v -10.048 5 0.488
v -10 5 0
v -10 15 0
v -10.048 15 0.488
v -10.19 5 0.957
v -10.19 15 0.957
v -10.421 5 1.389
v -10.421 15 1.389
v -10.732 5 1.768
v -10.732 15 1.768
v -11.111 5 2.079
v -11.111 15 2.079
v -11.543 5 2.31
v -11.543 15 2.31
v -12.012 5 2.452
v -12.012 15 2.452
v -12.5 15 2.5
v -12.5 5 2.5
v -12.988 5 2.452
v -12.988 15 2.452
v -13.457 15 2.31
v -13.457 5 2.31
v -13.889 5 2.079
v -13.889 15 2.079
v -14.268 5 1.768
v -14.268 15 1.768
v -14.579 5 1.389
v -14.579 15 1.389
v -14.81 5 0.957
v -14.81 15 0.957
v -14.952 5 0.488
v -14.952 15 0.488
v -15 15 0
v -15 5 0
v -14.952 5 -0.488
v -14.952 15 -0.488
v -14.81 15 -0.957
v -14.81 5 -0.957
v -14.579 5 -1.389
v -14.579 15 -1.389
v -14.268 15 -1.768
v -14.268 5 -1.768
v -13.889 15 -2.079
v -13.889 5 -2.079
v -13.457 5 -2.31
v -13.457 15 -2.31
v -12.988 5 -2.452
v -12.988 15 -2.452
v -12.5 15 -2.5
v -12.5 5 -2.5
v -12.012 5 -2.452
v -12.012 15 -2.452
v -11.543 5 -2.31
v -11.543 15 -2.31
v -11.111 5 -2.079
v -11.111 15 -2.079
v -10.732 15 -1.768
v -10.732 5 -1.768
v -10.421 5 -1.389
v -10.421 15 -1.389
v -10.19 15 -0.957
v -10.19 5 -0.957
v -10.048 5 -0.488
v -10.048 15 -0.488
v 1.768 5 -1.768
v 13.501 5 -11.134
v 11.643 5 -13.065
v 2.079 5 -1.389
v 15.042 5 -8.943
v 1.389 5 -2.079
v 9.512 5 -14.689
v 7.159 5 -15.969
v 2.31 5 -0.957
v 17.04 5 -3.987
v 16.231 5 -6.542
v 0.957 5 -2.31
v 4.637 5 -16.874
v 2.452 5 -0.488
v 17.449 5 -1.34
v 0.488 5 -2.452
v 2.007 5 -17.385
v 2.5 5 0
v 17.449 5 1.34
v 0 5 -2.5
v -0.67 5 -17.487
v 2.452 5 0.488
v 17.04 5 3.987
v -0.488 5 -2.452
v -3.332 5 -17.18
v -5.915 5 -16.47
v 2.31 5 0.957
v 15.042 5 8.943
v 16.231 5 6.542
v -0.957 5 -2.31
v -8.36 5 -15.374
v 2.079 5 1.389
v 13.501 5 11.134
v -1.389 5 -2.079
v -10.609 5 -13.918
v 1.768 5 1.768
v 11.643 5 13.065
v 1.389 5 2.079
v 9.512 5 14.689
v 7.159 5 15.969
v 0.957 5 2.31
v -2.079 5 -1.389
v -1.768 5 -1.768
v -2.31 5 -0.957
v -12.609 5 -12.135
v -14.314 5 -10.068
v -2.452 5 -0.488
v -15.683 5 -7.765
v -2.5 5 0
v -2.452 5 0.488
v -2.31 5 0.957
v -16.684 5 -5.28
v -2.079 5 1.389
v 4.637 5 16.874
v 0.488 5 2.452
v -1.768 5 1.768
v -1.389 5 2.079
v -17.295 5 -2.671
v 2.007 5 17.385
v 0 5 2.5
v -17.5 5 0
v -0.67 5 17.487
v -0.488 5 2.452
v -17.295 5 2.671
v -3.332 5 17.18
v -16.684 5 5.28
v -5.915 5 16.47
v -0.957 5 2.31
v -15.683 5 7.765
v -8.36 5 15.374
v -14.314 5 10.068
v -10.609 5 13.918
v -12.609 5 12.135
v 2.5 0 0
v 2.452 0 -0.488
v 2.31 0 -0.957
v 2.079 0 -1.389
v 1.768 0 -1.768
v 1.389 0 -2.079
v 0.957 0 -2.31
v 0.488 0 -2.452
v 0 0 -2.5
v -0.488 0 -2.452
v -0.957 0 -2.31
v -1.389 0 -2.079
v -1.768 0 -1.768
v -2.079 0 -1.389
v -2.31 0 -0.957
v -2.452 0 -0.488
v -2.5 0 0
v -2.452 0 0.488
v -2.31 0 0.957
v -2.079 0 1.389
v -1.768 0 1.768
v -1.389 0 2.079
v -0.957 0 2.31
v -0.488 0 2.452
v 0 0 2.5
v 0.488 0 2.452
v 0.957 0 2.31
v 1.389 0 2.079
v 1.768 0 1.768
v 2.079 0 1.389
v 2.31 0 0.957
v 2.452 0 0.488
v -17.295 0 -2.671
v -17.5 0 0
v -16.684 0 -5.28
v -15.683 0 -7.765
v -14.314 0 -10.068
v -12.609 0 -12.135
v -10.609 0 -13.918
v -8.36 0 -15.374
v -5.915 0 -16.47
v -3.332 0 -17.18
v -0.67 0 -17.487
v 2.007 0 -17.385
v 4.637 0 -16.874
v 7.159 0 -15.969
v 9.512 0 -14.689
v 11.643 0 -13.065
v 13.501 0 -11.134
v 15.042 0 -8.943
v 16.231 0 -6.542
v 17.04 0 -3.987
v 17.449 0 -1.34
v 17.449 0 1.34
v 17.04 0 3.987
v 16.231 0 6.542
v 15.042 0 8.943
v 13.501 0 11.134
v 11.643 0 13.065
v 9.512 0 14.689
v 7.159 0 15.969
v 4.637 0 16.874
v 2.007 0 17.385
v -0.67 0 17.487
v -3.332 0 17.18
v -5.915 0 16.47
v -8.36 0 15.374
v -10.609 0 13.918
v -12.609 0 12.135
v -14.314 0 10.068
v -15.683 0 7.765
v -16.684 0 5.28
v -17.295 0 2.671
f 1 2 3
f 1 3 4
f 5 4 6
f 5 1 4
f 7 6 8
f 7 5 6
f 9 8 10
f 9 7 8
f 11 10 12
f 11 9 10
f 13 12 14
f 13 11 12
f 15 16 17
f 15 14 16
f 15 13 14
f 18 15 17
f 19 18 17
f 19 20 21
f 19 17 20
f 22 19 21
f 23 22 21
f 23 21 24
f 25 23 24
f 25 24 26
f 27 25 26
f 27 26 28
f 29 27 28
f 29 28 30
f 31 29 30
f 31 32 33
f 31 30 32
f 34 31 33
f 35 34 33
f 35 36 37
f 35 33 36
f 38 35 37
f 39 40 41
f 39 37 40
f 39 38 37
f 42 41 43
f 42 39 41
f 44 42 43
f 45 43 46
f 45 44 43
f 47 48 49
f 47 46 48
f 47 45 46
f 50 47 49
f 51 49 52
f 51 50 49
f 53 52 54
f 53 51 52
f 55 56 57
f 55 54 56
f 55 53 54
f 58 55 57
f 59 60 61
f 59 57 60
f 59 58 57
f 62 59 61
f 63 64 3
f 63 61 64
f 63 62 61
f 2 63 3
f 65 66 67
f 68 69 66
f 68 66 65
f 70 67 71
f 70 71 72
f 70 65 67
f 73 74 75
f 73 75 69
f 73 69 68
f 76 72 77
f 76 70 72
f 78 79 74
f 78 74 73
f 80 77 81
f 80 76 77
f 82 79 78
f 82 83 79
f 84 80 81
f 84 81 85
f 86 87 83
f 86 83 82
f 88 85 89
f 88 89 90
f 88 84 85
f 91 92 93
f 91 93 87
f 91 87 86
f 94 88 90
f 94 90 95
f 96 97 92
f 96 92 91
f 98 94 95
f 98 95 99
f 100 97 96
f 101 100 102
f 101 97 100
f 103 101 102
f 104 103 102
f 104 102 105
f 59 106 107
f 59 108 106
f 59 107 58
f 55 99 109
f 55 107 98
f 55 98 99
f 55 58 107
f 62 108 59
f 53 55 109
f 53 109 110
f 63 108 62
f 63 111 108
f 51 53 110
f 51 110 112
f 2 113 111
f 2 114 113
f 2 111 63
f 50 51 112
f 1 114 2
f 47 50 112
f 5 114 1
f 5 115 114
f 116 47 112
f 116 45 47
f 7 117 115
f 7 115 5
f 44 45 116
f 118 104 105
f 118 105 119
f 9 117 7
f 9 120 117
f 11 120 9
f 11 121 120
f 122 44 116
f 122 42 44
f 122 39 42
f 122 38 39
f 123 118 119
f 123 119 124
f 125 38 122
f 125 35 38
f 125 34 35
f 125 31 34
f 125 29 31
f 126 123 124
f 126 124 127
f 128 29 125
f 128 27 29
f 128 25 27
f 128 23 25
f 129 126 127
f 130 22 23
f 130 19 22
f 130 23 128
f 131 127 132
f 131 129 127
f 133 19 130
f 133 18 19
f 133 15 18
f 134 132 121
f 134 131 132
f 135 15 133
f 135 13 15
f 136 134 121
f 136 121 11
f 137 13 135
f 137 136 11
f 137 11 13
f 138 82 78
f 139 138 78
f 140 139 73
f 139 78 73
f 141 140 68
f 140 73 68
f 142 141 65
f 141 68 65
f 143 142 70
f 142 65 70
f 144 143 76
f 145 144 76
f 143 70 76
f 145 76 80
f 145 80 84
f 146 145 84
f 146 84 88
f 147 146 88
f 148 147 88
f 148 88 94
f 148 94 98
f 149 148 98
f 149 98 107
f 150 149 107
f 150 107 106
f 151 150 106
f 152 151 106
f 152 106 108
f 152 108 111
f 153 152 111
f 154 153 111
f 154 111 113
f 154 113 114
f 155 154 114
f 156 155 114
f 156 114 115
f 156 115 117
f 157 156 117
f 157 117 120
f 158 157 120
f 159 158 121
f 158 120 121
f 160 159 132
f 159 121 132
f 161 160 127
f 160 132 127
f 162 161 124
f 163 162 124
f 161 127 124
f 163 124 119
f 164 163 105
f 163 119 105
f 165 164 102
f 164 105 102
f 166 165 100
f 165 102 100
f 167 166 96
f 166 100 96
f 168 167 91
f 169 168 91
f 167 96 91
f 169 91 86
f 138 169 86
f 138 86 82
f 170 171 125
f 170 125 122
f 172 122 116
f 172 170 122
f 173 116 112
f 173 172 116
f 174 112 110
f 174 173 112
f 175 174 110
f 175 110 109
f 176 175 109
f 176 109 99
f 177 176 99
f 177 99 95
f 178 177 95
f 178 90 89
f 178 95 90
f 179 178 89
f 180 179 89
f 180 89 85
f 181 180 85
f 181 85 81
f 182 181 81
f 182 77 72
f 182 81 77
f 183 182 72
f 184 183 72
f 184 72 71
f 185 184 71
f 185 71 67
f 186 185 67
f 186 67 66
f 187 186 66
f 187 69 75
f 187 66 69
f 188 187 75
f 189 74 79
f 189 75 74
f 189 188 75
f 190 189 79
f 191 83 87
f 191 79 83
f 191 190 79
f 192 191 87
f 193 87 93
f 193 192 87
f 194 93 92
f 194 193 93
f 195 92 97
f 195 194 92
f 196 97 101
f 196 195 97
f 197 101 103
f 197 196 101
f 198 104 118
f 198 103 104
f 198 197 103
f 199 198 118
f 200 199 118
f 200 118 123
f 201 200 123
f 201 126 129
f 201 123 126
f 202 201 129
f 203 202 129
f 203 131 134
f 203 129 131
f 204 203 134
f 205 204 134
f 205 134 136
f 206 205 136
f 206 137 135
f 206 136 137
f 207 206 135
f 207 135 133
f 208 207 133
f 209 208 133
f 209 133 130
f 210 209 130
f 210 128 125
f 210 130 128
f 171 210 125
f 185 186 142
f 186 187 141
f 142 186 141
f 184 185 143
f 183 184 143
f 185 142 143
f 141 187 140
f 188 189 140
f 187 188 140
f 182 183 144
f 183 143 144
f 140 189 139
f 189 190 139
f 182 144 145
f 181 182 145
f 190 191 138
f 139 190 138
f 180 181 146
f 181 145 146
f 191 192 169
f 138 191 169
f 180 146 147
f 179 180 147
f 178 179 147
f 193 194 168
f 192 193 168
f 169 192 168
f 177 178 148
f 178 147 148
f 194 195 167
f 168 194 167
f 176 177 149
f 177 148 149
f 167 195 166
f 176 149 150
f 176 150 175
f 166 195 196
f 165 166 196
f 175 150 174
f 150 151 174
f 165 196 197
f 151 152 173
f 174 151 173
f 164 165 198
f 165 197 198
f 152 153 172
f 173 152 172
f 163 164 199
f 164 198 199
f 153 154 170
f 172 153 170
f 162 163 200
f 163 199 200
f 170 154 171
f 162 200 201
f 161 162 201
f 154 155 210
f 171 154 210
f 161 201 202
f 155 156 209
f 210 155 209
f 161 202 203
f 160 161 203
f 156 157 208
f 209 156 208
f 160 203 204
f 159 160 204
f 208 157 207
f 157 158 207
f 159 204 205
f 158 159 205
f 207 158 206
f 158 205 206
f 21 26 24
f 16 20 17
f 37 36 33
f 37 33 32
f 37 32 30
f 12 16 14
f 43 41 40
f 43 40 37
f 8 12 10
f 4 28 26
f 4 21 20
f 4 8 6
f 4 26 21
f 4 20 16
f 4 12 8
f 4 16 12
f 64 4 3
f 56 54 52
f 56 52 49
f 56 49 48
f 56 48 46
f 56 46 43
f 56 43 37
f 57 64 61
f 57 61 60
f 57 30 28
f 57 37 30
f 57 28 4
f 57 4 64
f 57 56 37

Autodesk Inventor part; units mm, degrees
ref_plane "YZ Plane" through (0, 0, 0) normal (1, 0, 0) x (0, 1, 0)
ref_plane "XZ Plane" through (0, 0, 0) normal (0, 1, 0) x (-1, 0, 0)
ref_plane "XY Plane" through (0, 0, 0) normal (0, 0, 1) x (1, 0, 0)
sketch "Sketch1" plane through (0, 0, 0) normal (0, 1, 0) x (-1, 0, 0)
  circle A0 centre (0, 0) radius 17.5
  dimension "d0" = 35
extrude "Extrusion1" add sketch "Sketch1" along normal blind 5
sketch "Sketch2" plane through (0, 5, 0) normal (0, 1, 0) x (1, 0, 0)
  circle A0 centre (0, 0) radius 12.5 construction
  circle A1 centre (-12.5, 0) radius 2.5
  dimension "d3" = 25
  dimension "d4" = 5
extrude "Extrusion2" add sketch "Sketch2" along normal blind 10
sketch "Sketch3" plane through (0, 5, 0) normal (0, 1, 0) x (1, 0, 0)
  circle A0 centre (0, 0) radius 2.5
  dimension "d7" = 5
extrude "Extrusion3" cut sketch "Sketch3" against normal through all
properties part number "test1"
